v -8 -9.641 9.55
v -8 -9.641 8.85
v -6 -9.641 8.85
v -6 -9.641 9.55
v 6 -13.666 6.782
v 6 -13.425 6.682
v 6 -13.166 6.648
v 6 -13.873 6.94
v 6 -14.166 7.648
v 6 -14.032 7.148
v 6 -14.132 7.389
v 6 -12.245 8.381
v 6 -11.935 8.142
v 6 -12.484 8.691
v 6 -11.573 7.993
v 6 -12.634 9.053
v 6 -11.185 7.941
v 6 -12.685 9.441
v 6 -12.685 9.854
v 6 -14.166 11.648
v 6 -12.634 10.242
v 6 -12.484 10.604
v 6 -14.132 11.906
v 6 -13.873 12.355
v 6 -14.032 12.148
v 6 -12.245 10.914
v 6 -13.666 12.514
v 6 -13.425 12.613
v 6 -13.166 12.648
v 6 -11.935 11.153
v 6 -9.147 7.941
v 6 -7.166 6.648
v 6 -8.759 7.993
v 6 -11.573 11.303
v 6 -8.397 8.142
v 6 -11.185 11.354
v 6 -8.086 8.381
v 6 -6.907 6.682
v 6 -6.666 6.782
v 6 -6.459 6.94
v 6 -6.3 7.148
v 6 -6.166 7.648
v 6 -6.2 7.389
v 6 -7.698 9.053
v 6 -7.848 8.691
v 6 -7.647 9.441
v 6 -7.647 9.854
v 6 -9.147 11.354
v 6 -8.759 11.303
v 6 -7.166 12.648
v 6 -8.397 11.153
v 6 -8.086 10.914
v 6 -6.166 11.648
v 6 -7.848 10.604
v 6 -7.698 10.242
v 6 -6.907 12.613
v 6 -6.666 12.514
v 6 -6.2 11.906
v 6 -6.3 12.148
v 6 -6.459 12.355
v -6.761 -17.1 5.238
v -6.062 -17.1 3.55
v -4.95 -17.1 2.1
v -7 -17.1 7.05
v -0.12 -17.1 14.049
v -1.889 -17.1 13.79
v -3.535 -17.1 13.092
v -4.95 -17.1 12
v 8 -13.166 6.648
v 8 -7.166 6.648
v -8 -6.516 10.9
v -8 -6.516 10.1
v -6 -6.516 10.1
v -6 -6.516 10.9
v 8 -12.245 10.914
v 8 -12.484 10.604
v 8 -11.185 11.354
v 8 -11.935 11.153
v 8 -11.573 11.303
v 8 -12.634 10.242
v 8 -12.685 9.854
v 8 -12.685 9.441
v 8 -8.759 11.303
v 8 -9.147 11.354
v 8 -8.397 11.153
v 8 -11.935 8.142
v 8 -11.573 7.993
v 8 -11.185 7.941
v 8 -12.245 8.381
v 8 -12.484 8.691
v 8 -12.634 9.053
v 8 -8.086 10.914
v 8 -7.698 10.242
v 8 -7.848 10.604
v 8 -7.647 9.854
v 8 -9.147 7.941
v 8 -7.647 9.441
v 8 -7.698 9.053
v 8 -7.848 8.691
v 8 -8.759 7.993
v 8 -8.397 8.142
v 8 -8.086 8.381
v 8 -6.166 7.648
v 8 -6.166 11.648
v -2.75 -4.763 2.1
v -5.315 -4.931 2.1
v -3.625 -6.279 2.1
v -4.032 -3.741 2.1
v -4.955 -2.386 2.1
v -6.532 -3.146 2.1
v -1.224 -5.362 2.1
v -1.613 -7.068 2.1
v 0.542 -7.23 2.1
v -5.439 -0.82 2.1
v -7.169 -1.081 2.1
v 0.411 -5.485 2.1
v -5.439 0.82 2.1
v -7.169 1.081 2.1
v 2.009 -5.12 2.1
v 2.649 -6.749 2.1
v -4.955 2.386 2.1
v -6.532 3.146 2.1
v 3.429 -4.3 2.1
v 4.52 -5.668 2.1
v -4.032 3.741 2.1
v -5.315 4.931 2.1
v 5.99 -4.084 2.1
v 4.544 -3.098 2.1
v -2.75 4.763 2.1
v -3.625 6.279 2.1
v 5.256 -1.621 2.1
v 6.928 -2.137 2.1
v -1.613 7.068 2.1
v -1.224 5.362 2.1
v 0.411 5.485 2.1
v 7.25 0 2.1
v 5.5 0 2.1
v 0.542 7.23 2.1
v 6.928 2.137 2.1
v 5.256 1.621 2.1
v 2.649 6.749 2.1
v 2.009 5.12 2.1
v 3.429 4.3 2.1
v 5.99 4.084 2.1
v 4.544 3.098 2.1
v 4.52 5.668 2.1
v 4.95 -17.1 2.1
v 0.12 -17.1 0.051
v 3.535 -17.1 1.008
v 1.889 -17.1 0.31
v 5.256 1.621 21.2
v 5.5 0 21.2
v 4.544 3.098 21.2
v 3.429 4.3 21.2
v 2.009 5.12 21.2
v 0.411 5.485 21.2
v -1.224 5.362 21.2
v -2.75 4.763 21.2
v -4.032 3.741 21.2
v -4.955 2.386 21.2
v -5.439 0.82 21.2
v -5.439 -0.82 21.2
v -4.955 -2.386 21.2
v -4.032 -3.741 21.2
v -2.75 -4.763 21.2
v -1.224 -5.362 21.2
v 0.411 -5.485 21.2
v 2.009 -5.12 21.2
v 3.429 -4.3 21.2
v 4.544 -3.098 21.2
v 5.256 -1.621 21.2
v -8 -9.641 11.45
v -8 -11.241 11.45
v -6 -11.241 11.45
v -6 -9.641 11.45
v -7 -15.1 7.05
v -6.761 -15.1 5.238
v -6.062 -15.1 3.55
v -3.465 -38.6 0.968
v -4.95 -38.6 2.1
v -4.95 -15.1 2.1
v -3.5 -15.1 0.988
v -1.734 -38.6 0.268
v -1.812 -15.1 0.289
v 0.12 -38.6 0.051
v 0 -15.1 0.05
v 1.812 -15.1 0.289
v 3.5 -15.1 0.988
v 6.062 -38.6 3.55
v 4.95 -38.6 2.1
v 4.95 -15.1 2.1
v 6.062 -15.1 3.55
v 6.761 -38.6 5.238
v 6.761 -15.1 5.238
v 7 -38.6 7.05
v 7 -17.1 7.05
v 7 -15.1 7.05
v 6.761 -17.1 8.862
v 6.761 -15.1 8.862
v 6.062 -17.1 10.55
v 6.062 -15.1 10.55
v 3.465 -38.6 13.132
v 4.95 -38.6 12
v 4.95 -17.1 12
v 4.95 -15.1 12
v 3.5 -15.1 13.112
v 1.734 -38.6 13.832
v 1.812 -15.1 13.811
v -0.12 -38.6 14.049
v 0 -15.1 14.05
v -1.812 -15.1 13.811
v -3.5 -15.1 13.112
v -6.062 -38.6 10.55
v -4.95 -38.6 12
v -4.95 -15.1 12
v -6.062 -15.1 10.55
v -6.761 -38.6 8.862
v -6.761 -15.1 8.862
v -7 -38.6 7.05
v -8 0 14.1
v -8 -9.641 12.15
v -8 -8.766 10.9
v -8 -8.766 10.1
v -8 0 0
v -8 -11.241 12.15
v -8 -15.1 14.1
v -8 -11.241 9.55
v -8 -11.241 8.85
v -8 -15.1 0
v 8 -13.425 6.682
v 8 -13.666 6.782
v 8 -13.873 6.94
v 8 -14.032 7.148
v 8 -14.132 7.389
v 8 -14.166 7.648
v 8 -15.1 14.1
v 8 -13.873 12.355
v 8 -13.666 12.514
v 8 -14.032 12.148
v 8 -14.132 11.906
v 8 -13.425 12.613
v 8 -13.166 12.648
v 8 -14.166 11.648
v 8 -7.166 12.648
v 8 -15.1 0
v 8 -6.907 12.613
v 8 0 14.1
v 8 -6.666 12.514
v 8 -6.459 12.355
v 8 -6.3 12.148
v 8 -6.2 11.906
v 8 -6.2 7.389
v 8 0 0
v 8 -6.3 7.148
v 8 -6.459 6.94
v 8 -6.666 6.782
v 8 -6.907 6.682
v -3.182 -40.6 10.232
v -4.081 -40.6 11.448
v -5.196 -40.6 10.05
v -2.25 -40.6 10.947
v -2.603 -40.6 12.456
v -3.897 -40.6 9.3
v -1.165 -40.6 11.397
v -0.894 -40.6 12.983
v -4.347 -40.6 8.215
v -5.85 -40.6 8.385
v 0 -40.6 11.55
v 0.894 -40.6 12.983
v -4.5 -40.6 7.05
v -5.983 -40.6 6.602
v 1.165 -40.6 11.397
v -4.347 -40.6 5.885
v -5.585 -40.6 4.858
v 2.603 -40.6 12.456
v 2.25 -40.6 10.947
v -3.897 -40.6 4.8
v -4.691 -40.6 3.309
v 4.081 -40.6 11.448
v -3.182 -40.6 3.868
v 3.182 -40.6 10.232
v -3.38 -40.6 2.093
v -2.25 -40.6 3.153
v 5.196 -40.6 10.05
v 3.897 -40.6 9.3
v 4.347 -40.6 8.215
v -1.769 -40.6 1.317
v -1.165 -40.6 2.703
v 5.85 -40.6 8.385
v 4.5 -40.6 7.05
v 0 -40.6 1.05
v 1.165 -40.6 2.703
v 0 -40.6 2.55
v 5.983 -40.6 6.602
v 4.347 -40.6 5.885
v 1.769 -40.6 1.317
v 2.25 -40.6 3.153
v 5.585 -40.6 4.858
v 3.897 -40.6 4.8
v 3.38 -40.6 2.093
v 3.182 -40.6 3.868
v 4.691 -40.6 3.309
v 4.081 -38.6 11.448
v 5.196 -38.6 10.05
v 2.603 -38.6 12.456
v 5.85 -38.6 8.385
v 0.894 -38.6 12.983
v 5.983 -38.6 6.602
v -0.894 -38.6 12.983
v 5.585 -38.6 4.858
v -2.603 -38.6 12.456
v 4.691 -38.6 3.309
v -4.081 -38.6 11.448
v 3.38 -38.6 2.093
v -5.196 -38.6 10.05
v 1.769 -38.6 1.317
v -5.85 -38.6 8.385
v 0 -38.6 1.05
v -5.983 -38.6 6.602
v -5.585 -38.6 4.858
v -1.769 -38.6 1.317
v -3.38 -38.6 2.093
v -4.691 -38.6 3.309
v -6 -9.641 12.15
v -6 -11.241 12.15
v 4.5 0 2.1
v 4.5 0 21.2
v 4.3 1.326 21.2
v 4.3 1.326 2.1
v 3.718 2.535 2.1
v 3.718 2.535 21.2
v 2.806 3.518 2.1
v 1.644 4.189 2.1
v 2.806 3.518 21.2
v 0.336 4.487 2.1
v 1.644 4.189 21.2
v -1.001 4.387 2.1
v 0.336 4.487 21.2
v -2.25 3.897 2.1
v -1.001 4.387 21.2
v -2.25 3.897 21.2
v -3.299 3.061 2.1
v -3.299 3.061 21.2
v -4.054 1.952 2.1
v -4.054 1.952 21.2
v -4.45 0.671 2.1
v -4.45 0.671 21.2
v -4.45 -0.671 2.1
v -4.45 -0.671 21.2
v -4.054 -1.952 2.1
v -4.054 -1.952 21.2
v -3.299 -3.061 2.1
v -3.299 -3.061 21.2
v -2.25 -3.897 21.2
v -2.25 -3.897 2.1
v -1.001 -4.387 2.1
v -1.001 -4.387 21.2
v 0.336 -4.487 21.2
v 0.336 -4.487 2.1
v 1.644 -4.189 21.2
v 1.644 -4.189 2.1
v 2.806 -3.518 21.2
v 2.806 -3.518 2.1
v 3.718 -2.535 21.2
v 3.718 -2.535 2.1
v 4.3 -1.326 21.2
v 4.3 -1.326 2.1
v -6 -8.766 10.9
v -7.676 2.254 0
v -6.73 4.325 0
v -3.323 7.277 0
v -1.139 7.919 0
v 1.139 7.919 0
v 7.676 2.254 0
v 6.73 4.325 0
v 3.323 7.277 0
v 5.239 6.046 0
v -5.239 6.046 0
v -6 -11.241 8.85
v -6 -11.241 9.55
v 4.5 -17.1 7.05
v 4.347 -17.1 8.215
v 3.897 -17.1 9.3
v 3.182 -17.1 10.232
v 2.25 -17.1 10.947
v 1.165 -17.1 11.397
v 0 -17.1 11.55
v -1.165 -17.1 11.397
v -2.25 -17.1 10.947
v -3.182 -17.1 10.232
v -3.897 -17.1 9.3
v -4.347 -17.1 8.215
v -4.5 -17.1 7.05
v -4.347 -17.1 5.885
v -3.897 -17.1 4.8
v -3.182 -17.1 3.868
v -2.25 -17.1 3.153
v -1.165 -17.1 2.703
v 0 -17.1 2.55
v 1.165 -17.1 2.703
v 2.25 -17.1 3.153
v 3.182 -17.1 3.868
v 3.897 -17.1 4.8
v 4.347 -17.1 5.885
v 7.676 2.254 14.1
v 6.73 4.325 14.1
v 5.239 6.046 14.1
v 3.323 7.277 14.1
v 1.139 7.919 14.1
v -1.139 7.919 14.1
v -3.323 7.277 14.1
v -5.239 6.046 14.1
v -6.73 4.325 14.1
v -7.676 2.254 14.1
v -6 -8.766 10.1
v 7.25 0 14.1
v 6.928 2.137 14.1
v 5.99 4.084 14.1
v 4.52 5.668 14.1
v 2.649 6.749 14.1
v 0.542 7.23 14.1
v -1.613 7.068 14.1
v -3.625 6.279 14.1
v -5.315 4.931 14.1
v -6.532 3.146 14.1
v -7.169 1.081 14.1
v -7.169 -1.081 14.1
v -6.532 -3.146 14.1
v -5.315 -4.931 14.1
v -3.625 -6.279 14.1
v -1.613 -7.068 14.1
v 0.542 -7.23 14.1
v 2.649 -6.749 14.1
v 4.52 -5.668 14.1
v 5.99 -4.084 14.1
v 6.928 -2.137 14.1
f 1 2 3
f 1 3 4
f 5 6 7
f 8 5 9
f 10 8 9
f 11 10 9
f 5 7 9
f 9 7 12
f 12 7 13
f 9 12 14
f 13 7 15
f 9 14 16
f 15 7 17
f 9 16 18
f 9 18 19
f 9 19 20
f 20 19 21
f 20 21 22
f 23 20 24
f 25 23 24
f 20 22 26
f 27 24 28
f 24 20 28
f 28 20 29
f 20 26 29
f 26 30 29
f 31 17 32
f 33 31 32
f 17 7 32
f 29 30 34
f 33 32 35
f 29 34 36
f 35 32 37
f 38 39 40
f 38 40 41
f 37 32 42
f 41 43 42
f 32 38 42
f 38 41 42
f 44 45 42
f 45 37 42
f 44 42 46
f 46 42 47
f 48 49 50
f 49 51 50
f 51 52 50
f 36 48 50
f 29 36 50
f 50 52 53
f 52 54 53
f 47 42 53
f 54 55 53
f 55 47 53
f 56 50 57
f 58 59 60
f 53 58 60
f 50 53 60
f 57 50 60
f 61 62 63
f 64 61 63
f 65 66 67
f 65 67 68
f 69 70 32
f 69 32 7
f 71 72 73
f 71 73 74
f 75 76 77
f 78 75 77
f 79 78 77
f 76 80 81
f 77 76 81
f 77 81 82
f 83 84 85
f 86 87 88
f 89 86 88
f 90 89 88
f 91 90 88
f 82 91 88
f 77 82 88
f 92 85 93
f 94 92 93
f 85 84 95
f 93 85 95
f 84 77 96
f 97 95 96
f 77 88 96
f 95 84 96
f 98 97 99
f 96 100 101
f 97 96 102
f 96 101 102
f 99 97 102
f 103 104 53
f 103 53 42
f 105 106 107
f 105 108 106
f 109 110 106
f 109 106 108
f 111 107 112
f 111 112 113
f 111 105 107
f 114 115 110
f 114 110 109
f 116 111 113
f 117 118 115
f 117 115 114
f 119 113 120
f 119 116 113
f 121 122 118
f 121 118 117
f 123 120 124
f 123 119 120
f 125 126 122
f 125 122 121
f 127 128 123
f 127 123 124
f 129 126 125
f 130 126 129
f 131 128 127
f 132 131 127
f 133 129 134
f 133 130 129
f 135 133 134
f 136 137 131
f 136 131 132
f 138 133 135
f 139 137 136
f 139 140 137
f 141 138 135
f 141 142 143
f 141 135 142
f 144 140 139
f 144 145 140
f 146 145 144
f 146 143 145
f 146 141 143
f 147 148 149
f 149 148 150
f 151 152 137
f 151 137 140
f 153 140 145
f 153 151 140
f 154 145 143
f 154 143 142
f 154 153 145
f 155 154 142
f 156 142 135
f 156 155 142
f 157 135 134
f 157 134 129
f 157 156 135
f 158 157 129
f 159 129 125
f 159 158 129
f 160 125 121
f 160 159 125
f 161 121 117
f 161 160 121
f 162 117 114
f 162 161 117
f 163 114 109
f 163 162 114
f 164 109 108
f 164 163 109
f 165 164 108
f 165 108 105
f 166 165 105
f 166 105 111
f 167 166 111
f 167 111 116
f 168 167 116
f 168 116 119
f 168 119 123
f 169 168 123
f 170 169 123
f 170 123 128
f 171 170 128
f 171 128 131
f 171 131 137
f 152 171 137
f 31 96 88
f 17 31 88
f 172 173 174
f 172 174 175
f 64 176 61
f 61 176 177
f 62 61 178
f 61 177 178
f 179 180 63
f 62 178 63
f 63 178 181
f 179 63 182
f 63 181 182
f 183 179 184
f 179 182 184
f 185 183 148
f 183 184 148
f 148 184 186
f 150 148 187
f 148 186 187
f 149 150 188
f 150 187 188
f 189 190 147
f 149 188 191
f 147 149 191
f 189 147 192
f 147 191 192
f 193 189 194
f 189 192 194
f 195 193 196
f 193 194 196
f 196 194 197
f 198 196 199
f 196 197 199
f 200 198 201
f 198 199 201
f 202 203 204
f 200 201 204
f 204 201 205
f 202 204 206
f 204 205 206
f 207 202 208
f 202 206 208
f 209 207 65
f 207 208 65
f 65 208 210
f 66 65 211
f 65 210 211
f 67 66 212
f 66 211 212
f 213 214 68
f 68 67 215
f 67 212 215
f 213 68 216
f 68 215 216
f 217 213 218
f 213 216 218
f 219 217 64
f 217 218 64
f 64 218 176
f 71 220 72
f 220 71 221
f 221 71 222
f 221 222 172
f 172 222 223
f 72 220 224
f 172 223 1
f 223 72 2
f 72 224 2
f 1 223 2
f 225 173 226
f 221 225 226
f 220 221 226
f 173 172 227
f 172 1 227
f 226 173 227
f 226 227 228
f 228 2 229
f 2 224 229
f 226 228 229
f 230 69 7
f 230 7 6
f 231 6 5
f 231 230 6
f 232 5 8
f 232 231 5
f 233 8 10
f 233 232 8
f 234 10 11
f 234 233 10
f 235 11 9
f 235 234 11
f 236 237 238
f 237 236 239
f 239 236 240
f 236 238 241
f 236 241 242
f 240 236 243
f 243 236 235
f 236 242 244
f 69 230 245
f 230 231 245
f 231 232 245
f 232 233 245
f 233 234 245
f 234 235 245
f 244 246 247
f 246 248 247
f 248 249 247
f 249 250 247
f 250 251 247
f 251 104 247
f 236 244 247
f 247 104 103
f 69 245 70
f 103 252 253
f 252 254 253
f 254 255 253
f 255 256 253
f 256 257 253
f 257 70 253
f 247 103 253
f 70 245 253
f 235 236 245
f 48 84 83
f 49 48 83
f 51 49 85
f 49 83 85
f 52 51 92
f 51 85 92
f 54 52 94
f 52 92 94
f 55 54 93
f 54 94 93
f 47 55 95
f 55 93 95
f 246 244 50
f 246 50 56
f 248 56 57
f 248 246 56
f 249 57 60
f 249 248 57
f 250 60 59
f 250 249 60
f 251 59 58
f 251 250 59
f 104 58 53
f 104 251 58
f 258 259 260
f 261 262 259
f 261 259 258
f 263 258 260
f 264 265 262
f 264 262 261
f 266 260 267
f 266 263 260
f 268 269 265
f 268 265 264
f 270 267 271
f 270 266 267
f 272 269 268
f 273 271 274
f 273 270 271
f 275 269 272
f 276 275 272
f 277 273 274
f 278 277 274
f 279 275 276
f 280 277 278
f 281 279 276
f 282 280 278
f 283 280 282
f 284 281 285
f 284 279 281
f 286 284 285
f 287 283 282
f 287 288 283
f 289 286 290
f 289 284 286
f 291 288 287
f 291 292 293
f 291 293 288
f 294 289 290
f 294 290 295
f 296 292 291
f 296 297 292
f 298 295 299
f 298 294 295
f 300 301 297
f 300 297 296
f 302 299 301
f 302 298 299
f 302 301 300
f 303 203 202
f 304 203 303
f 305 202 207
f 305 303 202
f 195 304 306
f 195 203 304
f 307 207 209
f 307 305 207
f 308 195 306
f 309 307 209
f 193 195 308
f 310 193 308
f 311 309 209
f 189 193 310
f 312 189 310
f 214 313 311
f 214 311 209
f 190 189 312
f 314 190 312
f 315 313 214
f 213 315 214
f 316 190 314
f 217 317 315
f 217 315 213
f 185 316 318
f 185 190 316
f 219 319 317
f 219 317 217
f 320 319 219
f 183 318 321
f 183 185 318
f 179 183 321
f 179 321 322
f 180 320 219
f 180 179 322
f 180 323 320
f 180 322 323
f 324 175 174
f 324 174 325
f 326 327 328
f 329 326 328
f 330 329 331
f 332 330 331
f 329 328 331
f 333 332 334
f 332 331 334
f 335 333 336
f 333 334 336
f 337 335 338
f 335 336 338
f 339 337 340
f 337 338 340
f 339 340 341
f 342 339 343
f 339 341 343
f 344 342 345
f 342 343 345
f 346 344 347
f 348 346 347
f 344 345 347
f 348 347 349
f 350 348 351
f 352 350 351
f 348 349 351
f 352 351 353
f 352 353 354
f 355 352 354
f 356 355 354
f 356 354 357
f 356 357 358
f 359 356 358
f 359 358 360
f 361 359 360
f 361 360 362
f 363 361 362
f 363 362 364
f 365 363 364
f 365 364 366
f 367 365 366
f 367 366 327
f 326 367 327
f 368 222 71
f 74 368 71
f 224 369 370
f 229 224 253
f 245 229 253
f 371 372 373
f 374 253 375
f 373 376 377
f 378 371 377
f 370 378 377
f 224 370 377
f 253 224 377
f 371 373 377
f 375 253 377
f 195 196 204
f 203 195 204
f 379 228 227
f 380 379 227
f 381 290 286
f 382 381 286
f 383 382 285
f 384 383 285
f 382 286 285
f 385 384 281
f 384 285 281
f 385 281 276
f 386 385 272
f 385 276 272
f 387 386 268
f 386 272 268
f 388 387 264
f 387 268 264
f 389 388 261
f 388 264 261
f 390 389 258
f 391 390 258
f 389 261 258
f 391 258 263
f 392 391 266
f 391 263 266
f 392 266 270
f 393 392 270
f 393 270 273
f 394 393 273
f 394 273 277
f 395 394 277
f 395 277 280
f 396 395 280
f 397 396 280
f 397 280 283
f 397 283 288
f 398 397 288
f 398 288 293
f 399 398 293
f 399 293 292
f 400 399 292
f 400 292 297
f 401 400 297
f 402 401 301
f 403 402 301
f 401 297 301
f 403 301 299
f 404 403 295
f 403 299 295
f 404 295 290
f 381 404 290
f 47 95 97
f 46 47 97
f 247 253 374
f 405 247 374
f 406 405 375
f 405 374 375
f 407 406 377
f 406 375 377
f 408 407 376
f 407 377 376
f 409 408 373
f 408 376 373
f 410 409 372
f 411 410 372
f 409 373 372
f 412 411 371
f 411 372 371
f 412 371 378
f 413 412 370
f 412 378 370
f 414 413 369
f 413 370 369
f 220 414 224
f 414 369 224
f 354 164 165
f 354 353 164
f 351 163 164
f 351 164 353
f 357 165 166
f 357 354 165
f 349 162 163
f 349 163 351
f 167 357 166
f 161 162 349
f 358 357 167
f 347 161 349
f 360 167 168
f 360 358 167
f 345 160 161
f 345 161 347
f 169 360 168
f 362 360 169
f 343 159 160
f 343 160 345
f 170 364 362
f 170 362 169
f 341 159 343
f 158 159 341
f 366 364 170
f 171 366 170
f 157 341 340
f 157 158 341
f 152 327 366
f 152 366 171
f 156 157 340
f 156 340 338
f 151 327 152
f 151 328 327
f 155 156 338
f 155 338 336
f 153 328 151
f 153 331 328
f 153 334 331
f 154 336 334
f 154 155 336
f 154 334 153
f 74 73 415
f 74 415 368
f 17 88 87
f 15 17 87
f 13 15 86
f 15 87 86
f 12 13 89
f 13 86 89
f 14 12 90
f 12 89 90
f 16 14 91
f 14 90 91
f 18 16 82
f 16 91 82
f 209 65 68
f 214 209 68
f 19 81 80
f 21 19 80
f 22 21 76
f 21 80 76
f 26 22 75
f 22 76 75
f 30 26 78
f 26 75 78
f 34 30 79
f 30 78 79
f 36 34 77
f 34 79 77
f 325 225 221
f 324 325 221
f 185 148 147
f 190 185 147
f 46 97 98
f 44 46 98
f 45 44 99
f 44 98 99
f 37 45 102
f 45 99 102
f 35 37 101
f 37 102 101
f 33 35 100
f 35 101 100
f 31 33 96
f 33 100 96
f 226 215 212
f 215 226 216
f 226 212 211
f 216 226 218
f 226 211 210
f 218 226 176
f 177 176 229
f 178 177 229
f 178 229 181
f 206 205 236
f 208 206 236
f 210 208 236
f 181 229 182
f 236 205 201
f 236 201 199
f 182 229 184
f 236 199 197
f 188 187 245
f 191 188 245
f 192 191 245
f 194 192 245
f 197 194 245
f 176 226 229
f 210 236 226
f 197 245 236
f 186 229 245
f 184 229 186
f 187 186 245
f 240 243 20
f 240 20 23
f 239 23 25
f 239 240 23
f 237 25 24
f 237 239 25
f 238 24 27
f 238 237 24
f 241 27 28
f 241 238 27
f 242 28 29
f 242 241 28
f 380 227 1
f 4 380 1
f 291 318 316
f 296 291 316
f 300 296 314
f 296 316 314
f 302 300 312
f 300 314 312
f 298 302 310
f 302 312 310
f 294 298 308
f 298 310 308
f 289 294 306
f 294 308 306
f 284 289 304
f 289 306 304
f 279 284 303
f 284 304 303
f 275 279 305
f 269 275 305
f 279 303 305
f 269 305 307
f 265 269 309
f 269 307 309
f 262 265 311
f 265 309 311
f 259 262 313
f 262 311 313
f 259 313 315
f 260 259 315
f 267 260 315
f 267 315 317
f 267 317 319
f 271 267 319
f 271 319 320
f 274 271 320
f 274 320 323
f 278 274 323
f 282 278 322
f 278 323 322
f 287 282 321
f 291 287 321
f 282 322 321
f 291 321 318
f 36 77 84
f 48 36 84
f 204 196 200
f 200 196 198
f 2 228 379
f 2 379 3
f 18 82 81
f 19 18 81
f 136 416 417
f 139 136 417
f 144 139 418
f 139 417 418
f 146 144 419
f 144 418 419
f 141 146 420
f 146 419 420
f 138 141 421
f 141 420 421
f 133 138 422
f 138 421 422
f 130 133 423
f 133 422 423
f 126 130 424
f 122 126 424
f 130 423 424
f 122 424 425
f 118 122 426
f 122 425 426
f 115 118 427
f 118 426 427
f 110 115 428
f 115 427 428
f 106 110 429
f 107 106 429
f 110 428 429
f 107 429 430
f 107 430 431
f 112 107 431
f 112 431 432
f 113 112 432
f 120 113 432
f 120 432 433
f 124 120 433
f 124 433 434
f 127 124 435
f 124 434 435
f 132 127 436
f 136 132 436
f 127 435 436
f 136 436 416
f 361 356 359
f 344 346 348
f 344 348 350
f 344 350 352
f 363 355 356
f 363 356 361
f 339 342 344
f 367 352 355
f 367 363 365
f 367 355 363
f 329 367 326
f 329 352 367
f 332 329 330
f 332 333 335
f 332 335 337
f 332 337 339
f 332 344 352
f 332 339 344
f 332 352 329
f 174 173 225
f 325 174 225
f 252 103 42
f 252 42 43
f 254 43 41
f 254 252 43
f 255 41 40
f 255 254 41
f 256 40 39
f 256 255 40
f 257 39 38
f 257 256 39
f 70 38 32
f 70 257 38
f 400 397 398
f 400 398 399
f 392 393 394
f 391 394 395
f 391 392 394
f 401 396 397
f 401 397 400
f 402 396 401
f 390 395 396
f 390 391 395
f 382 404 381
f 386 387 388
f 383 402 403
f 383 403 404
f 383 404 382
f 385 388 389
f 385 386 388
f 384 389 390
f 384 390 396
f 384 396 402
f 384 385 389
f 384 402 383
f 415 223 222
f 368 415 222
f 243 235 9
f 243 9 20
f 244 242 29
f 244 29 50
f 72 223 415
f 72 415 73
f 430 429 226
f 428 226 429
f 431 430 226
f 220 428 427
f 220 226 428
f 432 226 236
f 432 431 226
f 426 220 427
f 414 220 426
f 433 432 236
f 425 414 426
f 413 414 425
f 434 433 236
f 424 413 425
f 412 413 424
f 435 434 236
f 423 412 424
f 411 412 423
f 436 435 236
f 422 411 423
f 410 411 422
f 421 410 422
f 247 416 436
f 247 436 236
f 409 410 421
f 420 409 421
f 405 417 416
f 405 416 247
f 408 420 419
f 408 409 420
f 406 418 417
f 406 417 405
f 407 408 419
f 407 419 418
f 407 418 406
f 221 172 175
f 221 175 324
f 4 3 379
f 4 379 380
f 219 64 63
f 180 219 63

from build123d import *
from build123d.topology import SkipClean

# Parameters (mm, degrees)
BOSS_EXTRUDE1_DEPTH = 14.1
SKETCH2_R           = 7
BOSS_EXTRUDE2_DEPTH = 2
BOSS_EXTRUDE6_DEPTH = 21.5
SKETCH9_R           = 4.5
CUT_EXTRUDE6_DEPTH  = 20
SKETCH11_R          = 6
BOSS_EXTRUDE8_DEPTH = 2
CUT_EXTRUDE7_START  = 27
SKETCH3_R           = 4.5
CUT_EXTRUDE7_DEPTH  = 27
SKETCH12_R          = 4.5
CUT_EXTRUDE8_DEPTH  = 12
SKETCH12_3_R        = 7.25
SKETCH12_3_R_2      = 5.5
CUT_EXTRUDE9_DEPTH  = 12
BOSS_EXTRUDE9_START = 7.1
SKETCH12_4_R        = 5.5
SKETCH12_4_R_2      = 4.5
BOSS_EXTRUDE9_DEPTH = 7.1
SKETCH13_W          = 0.8
SKETCH13_H          = 2.25
SKETCH13_W_2        = 0.7
SKETCH13_H_2        = 1.6
CUT_EXTRUDE10_DEPTH = 2
CUT_EXTRUDE12_DEPTH = 2


with BuildPart() as part:
    # Sketch1 → Boss-Extrude1 (new body)
    with BuildSketch(Plane.XY):
        with BuildLine():
            ThreePointArc((8, 0), (0, 8), (-8, 0))
            Line((-8, 0), (-8, -15.1))
            Line((-8, -15.1), (8, -15.1))
            Line((8, -15.1), (8, 0))
        make_face()
    extrude(amount=BOSS_EXTRUDE1_DEPTH)

    # Sketch2 → Boss-Extrude2 (add)
    with BuildSketch(Plane.XZ.offset(15.1)):
        with Locations((0, 7.05)):
            Circle(SKETCH2_R)
    extrude(amount=BOSS_EXTRUDE2_DEPTH)

    # Sketch8 → Boss-Extrude6 (add)
    with SkipClean():  # the faces are left unmerged after this step: merging them gives an invalid solid
        with BuildSketch(Plane(origin=(0, -17.1, 0), x_dir=(-1, 0, 0), z_dir=(0, -1, 0))):
            with BuildLine():
                Line((7, -7.05), (4.949747468, -2.100252532))
                ThreePointArc((4.949747468, -2.100252532), (2.623124592, -0.560067999), (-0.120272225, -0.05103332))
                Line((-0.120272225, -0.05103332), (-4.949747468, -2.100252532))
                ThreePointArc((-4.949747468, -2.100252532), (-6.467156728, -4.371215973), (-7, -7.05))
                Line((-7, -7.05), (-4.949747468, -11.999747468))
                ThreePointArc((-4.949747468, -11.999747468), (-2.623124592, -13.539932001), (0.120272225, -14.04896668))
                Line((0.120272225, -14.04896668), (4.949747468, -11.999747468))
                ThreePointArc((4.949747468, -11.999747468), (6.467156728, -9.728784027), (7, -7.05))
            make_face()
        extrude(amount=BOSS_EXTRUDE6_DEPTH)

    # Sketch9 → Cut-Extrude6 (cut)
    with SkipClean():  # the faces are left unmerged after this step: merging them gives an invalid solid
        with BuildSketch(Plane(origin=(0, -38.6, 0), x_dir=(-1, 0, 0), z_dir=(0, -1, 0))):
            with Locations((0, -7.05)):
                Circle(SKETCH9_R)
        extrude(amount=-CUT_EXTRUDE6_DEPTH, mode=Mode.SUBTRACT)

    # Sketch11 → Boss-Extrude8 (add)
    with SkipClean():  # the faces are left unmerged after this step: merging them gives an invalid solid
        with BuildSketch(Plane(origin=(0, -38.6, 0), x_dir=(-1, 0, 0), z_dir=(0, -1, 0))):
            with Locations((0, -7.05)):
                Circle(SKETCH11_R)
        extrude(amount=BOSS_EXTRUDE8_DEPTH)

    # Sketch3 → Cut-Extrude7 (cut)
    with SkipClean():  # the faces are left unmerged after this step: merging them gives an invalid solid
        with BuildSketch(Plane.XZ.offset(17.1).offset(CUT_EXTRUDE7_START)):
            with Locations((0, 7.05)):
                Circle(SKETCH3_R)
        extrude(amount=-CUT_EXTRUDE7_DEPTH, mode=Mode.SUBTRACT)

    # Sketch12 → Cut-Extrude8 (cut)
    with SkipClean():  # the faces are left unmerged after this step: merging them gives an invalid solid
        with BuildSketch(Plane.XY.offset(14.1)):
            Circle(SKETCH12_R)
        extrude(amount=-CUT_EXTRUDE8_DEPTH, mode=Mode.SUBTRACT)

    # Sketch12<3> → Cut-Extrude9 (cut)
    with SkipClean():  # the faces are left unmerged after this step: merging them gives an invalid solid
        with BuildSketch(Plane.XY.offset(14.1)):
            Circle(SKETCH12_3_R)
            Circle(SKETCH12_3_R_2, mode=Mode.SUBTRACT)
        extrude(amount=-CUT_EXTRUDE9_DEPTH, mode=Mode.SUBTRACT)

    # Sketch12<4> → Boss-Extrude9 (add)
    with SkipClean():  # the faces are left unmerged after this step: merging them gives an invalid solid
        with BuildSketch(Plane.XY.offset(14.1).offset(BOSS_EXTRUDE9_START)):
            Circle(SKETCH12_4_R)
            Circle(SKETCH12_4_R_2, mode=Mode.SUBTRACT)
        extrude(amount=-BOSS_EXTRUDE9_DEPTH)

    # Sketch13 → Cut-Extrude10 (cut)
    with SkipClean():  # the faces are left unmerged after this step: merging them gives an invalid solid
        with BuildSketch(Plane.ZY.offset(8)):
            with Locations((10.5, -7.641192761)):
                Rectangle(SKETCH13_W, SKETCH13_H)
            with Locations((11.8, -10.441164669)):
                Rectangle(SKETCH13_W_2, SKETCH13_H_2)
            with Locations((9.2, -10.441164669)):
                Rectangle(SKETCH13_W_2, SKETCH13_H_2)
        extrude(amount=-CUT_EXTRUDE10_DEPTH, mode=Mode.SUBTRACT)

    # Sketch14 → Cut-Extrude12 (cut)
    with SkipClean():  # the faces are left unmerged after this step: merging them gives an invalid solid
        with BuildSketch(Plane(origin=(8, 0, 0), x_dir=(0, 0, -1), z_dir=(1, 0, 0))):
            with BuildLine():
                Line((-7.64754844, -14.165884792), (-11.64754844, -14.165884792))
                ThreePointArc((-11.64754844, -14.165884792), (-12.354655221, -13.872991573), (-12.64754844, -13.165884792))
                Line((-12.64754844, -13.165884792), (-12.64754844, -7.165884792))
                ThreePointArc((-12.64754844, -7.165884792), (-12.354655221, -6.45877801), (-11.64754844, -6.165884792))
                Line((-11.64754844, -6.165884792), (-7.64754844, -6.165884792))
                ThreePointArc((-7.64754844, -6.165884792), (-6.940441659, -6.45877801), (-6.64754844, -7.165884792))
                Line((-6.64754844, -7.165884792), (-6.64754844, -13.165884792))
                ThreePointArc((-6.64754844, -13.165884792), (-6.940441659, -13.872991573), (-7.64754844, -14.165884792))
            make_face()
            with BuildLine():
                Line((-9.441476419, -12.684690809), (-9.85362046, -12.684690809))
                ThreePointArc((-9.85362046, -12.684690809), (-10.914280632, -12.245350981), (-11.35362046, -11.184690809))
                Line((-11.35362046, -11.184690809), (-11.35362046, -9.147078774))
                ThreePointArc((-11.35362046, -9.147078774), (-10.914280632, -8.086418602), (-9.85362046, -7.647078774))
                Line((-9.85362046, -7.647078774), (-9.441476419, -7.647078774))
                ThreePointArc((-9.441476419, -7.647078774), (-8.380816248, -8.086418602), (-7.941476419, -9.147078774))
                Line((-7.941476419, -9.147078774), (-7.941476419, -11.184690809))
                ThreePointArc((-7.941476419, -11.184690809), (-8.380816248, -12.245350981), (-9.441476419, -12.684690809))
            make_face(mode=Mode.SUBTRACT)
        extrude(amount=-CUT_EXTRUDE12_DEPTH, mode=Mode.SUBTRACT)


solid = part.part
